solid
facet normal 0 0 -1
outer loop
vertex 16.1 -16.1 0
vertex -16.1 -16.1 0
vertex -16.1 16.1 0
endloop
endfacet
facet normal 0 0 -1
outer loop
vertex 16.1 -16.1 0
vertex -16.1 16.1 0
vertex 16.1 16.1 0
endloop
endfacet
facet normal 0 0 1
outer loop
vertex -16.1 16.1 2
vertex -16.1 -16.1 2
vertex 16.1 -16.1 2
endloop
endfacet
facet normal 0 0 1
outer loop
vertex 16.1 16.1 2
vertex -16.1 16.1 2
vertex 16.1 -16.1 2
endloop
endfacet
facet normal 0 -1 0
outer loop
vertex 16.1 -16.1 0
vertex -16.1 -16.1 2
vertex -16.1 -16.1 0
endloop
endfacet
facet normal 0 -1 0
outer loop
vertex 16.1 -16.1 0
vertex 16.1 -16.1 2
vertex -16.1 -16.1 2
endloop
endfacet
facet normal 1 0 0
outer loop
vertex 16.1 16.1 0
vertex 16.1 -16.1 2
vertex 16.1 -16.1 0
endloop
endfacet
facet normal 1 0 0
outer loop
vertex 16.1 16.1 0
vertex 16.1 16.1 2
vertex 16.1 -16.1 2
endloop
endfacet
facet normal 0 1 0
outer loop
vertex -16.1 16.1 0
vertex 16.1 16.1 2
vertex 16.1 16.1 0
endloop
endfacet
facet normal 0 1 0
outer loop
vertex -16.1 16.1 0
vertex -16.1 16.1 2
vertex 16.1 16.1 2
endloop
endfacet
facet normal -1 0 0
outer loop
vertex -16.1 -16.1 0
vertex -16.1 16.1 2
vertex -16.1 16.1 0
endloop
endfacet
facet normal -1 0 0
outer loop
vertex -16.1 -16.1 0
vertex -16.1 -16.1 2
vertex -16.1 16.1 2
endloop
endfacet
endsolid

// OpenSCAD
// file: ../diffuser.scad
// Swappable diffuser panel. Thickness is the STL knob; the diffusing structure
// (gyroid/grid, density, top/bottom solid layers = 0) is set in the slicer.

module diffuser_panel(t) {
    linear_extrude(t) square([panel_side, panel_side], center = true);
}
// file: ../config.scad
// ===== CHARGE LED sign — global config =====
// Edit this file; then run ./build.sh to regenerate every STL.

$fn = 72;

// ---- calibrated collar (press-fit for 12mm bullet pixel) ----
collar_stl    = "../../assets/bullet-collar.stl"; // path resolved from src/parts/ entry files
collar_h      = 2.0;     // Z span of the collar STL
collar_od     = 16.0;    // collar outer diameter
collar_cx     = 43.0;    // STL native X center (Y center is 0)
pixel_through = 12.3;    // clearance hole through the plate (just over bore Ø12.19)
dome_clear    = 9.0;     // lit dome protrusion above the rear plate — MEASURE on your pixel

// ---- shell ----
plate_t    = 2.0;        // rear plate thickness (== collar_h, so the collar sits flush)
wall_t     = 2.5;        // chimney wall thickness
cell_inner = 30;         // square interior of each test cell
lip_t      = 1.2;        // outer locating-lip thickness
lip_h      = 3.5;        // lip height above the seat (captures the panel)

// ---- diffuser panels ----
panel_clear  = 0.4;      // clearance so a panel drops into the lip
panel_thicks = [1, 2, 3];

// ---- coupon depth ladder ----
led_gaps = [20, 35, 50]; // clear LED-tip -> panel distance, per cell (mm)

// ---- derived ----
cell_pitch = cell_inner + 2 * wall_t;      // outer cell footprint (35)
n_cells    = len(led_gaps);
plate_w    = n_cells * cell_pitch;
plate_d    = cell_pitch;
panel_side = cell_pitch - 2 * lip_t - panel_clear;
function cell_x(i)     = i * cell_pitch + cell_pitch / 2;
function chimney_H(i)  = plate_t + dome_clear + led_gaps[i];
// main file
// Build target: 2mm diffuser panel.
include <../config.scad>
include <../diffuser.scad>
diffuser_panel(2);
